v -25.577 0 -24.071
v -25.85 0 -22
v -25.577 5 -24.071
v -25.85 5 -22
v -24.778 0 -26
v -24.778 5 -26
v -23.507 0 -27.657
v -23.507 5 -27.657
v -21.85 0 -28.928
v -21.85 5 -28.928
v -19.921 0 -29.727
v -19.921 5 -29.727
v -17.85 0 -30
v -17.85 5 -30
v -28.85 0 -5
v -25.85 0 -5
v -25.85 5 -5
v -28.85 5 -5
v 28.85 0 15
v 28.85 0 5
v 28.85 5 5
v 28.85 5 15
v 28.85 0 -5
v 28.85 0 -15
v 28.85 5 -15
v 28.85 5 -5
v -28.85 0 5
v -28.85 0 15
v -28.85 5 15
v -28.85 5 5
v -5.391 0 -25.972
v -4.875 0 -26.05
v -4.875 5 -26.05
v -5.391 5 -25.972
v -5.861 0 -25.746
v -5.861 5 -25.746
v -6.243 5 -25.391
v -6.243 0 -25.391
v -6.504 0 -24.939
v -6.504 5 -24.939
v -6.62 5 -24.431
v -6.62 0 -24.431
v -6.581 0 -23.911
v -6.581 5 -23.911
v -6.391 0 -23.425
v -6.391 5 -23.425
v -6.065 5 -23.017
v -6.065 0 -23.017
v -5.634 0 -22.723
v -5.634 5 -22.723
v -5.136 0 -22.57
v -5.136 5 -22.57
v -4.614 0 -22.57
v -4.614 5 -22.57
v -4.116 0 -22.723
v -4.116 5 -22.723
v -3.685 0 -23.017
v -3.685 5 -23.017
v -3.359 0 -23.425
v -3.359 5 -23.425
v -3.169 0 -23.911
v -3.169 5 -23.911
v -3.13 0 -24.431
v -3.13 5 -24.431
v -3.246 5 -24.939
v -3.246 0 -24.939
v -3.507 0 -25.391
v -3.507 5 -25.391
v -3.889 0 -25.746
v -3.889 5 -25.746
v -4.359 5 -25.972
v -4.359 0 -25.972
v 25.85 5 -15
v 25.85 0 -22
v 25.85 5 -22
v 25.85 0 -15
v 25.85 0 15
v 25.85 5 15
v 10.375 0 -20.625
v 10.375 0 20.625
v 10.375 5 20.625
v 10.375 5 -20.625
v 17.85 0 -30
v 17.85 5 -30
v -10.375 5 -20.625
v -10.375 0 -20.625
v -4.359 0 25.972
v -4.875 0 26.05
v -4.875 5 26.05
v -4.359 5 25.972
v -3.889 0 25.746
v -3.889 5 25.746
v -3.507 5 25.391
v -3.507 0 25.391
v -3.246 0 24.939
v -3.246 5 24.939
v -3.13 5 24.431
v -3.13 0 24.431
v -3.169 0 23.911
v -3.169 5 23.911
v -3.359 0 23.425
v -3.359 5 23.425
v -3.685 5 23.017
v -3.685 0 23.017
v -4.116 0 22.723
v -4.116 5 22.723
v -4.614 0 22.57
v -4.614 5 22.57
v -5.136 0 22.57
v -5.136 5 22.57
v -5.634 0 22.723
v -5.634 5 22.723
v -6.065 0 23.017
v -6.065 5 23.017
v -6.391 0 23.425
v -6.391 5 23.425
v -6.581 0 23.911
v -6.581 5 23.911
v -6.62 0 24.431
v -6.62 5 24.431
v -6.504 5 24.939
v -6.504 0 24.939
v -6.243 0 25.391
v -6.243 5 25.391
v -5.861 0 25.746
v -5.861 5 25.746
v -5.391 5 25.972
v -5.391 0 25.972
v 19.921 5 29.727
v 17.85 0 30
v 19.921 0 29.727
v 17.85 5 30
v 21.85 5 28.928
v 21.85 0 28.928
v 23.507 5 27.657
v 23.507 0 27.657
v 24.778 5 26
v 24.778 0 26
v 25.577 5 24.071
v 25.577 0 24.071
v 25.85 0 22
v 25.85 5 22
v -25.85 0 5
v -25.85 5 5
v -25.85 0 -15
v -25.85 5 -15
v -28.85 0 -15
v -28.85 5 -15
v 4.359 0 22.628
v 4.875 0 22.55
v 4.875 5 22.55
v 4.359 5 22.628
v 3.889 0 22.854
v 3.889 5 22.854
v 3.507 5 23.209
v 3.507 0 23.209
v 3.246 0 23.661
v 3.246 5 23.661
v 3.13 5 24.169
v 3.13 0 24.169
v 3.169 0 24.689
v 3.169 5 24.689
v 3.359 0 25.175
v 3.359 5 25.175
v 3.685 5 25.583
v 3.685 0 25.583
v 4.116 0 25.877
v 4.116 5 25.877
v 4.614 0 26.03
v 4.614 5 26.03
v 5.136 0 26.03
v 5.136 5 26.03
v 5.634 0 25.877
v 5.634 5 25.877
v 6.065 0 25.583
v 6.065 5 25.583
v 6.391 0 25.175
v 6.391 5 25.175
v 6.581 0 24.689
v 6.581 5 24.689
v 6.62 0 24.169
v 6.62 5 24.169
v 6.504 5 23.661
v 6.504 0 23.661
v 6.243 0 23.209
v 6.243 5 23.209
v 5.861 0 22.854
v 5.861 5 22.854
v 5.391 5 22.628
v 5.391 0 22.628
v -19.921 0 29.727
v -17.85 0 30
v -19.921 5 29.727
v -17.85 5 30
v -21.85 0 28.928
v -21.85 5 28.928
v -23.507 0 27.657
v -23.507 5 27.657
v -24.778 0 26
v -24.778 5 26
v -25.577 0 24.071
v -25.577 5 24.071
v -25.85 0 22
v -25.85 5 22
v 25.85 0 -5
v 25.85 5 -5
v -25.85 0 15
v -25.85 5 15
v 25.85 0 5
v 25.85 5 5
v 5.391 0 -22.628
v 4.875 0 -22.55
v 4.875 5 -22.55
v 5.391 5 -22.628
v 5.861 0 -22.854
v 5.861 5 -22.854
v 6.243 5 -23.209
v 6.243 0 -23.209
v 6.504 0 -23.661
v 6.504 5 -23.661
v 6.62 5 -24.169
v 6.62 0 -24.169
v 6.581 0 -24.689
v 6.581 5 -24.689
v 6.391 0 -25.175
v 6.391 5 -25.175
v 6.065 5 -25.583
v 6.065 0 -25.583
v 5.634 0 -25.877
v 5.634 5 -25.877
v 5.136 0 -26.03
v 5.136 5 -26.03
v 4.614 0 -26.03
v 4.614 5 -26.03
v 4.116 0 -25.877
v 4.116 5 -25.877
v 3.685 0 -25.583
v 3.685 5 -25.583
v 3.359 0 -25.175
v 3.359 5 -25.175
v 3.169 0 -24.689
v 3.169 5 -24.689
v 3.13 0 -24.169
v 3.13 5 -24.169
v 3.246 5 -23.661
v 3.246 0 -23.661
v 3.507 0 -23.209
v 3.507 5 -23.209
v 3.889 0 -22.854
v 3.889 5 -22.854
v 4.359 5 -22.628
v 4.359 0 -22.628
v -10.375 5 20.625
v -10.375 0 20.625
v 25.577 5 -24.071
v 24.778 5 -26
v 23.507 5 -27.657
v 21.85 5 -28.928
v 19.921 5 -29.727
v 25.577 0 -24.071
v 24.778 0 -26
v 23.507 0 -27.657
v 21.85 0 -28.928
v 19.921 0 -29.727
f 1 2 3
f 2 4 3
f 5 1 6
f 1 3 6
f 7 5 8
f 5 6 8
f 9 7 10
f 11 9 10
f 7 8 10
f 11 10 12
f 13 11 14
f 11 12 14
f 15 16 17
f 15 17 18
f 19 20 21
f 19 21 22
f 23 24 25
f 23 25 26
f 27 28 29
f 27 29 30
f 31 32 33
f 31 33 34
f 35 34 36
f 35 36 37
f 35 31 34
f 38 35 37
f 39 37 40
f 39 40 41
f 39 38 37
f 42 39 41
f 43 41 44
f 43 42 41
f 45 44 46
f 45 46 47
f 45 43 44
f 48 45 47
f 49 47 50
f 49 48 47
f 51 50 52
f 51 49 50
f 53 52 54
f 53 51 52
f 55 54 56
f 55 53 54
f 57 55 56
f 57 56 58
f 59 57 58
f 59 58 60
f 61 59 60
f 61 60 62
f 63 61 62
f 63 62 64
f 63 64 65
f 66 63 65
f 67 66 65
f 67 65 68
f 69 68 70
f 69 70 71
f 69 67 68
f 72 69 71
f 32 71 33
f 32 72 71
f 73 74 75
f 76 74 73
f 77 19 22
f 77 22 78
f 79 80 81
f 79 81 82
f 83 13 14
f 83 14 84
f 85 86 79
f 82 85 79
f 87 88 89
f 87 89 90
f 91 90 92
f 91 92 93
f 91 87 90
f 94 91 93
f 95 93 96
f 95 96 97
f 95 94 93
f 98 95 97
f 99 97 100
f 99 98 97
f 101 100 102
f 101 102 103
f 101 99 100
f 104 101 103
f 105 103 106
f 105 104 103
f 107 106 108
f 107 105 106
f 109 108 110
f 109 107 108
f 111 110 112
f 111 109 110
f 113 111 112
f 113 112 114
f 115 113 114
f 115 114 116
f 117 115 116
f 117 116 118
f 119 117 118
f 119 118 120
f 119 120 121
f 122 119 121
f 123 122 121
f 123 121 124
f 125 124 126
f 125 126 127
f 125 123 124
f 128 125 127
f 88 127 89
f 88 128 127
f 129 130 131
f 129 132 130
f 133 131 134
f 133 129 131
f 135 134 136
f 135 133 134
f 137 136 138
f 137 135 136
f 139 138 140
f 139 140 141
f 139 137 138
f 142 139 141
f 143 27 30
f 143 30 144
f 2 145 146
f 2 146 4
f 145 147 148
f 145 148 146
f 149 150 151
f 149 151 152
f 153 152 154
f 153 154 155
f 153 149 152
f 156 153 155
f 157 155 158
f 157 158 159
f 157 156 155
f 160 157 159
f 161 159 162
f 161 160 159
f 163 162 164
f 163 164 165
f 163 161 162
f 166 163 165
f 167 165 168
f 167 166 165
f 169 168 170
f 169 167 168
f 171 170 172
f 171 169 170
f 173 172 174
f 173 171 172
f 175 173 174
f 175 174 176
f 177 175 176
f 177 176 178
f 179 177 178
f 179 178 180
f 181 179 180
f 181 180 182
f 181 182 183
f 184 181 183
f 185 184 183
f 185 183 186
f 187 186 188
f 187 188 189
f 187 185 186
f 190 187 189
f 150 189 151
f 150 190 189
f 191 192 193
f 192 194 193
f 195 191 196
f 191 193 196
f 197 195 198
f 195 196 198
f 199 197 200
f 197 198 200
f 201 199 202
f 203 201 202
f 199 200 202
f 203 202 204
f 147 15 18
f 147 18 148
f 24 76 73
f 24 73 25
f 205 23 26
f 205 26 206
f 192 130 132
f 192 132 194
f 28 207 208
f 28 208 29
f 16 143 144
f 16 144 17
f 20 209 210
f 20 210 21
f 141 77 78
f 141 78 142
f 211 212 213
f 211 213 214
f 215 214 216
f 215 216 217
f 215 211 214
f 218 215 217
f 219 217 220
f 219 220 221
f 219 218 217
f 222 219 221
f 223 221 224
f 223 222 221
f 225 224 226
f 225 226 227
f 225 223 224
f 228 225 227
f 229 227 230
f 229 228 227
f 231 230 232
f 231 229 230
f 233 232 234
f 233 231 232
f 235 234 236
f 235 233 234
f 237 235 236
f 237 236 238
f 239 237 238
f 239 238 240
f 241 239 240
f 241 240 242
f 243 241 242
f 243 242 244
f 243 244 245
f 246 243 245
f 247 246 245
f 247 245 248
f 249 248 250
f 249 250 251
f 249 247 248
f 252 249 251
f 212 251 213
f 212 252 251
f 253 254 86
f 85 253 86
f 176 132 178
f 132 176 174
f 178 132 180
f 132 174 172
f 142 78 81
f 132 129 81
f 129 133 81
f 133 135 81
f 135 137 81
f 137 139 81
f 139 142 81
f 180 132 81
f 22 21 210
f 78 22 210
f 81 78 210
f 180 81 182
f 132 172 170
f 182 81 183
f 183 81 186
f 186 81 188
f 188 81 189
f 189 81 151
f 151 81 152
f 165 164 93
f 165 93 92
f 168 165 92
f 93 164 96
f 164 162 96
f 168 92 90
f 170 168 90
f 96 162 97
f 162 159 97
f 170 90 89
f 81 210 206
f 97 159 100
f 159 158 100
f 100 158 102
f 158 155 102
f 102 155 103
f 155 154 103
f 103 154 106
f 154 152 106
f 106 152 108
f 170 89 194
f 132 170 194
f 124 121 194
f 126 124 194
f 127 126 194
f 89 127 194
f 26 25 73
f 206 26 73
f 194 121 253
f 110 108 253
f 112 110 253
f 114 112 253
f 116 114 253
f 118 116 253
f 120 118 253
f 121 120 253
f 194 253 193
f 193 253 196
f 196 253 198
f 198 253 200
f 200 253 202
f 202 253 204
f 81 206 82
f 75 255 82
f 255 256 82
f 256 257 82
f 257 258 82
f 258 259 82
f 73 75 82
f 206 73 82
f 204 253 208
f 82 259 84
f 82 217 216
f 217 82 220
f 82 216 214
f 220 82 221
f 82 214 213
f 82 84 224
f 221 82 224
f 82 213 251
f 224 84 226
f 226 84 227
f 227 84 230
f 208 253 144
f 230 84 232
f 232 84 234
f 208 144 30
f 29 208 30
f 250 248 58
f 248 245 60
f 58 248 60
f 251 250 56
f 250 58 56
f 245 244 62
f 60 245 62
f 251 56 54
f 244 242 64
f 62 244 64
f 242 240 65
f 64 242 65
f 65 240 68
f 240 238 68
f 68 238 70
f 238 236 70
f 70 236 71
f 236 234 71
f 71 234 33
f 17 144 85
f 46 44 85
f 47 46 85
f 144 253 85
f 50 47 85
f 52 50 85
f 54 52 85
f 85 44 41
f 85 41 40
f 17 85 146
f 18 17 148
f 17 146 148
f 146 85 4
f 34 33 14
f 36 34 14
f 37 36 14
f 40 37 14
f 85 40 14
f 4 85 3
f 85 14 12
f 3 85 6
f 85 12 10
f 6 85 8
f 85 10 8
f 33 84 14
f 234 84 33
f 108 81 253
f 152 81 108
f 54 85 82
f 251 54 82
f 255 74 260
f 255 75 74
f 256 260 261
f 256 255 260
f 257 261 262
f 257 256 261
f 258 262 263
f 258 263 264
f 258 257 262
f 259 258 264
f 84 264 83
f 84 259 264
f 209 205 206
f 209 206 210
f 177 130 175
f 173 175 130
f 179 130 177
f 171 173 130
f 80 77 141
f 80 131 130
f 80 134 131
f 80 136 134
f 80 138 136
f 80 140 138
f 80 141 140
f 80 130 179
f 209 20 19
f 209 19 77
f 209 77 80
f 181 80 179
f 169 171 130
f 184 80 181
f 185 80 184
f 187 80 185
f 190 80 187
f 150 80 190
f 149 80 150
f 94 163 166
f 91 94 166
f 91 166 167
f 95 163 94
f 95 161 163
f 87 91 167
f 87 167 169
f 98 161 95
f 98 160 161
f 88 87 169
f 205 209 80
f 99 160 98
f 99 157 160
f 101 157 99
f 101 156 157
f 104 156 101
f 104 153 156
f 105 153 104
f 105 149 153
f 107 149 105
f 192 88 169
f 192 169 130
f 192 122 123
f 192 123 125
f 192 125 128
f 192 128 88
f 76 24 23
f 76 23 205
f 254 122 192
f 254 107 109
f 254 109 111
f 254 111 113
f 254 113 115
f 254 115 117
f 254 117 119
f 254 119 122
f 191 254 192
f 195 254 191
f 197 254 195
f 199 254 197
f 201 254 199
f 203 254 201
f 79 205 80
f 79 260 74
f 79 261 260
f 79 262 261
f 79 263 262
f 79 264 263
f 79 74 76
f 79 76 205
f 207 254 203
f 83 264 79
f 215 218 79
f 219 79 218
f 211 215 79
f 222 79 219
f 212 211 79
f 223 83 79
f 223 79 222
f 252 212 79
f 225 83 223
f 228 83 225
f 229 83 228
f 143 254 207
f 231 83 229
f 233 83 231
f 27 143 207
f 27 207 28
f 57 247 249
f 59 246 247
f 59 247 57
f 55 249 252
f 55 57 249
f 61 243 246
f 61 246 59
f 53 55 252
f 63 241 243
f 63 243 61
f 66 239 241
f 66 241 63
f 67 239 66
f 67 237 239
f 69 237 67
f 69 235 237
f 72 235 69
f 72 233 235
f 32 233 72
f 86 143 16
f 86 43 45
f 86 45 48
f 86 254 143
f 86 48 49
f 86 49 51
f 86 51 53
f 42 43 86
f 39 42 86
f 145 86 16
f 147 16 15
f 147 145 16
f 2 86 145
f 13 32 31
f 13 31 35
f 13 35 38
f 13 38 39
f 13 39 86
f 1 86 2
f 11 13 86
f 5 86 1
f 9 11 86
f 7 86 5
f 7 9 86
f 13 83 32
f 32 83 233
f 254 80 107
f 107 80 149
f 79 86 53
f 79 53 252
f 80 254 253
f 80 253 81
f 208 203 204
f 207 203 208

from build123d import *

# Parameters (mm, degrees)
SKETCH_1_R      = 1.75
SKETCH_1_W      = 20.75
SKETCH_1_H      = 41.25
EXTRUDE_1_DEPTH = 5
FILLET_1_R      = 8


with BuildPart() as part:
    # 草图1 → 凸台-拉伸1 (new body)
    with BuildSketch(Plane(origin=(0, 0, 0), x_dir=(1, 0, 0), z_dir=(0, 1, 0))):
        Polygon((25.85, -30), (-25.85, -30), (-25.85, -15), (-28.85, -15), (-28.85, -5), (-25.85, -5), (-25.85, 5), (-28.85, 5), (-28.85, 15), (-25.85, 15), (-25.85, 30), (25.85, 30), (25.85, 15), (28.85, 15), (28.85, 5), (25.85, 5), (25.85, -5), (28.85, -5), (28.85, -15), (25.85, -15), align=None)
        with Locations(Location((-4.875, -24.3, 0), (0, 0, 270))):
            Circle(SKETCH_1_R, mode=Mode.SUBTRACT)
        with Locations(Location((4.875, -24.3, 0), (0, 0, 90))):
            Circle(SKETCH_1_R, mode=Mode.SUBTRACT)
        with Locations(Location((4.875, 24.3, 0), (0, 0, 270))):
            Circle(SKETCH_1_R, mode=Mode.SUBTRACT)
        with Locations(Location((-4.875, 24.3, 0), (0, 0, 90))):
            Circle(SKETCH_1_R, mode=Mode.SUBTRACT)
        Rectangle(SKETCH_1_W, SKETCH_1_H, mode=Mode.SUBTRACT)
    extrude(amount=EXTRUDE_1_DEPTH)

    # 圆角1
    fillet_1_edges = [part.edges().sort_by_distance(p)[0] for p in [
        (-25.85, 2.5, -30),
        (25.85, 2.5, -30),
        (25.85, 2.5, 30),
        (-25.85, 2.5, 30),
    ]]
    fillet(fillet_1_edges, radius=FILLET_1_R)


solid = part.part
